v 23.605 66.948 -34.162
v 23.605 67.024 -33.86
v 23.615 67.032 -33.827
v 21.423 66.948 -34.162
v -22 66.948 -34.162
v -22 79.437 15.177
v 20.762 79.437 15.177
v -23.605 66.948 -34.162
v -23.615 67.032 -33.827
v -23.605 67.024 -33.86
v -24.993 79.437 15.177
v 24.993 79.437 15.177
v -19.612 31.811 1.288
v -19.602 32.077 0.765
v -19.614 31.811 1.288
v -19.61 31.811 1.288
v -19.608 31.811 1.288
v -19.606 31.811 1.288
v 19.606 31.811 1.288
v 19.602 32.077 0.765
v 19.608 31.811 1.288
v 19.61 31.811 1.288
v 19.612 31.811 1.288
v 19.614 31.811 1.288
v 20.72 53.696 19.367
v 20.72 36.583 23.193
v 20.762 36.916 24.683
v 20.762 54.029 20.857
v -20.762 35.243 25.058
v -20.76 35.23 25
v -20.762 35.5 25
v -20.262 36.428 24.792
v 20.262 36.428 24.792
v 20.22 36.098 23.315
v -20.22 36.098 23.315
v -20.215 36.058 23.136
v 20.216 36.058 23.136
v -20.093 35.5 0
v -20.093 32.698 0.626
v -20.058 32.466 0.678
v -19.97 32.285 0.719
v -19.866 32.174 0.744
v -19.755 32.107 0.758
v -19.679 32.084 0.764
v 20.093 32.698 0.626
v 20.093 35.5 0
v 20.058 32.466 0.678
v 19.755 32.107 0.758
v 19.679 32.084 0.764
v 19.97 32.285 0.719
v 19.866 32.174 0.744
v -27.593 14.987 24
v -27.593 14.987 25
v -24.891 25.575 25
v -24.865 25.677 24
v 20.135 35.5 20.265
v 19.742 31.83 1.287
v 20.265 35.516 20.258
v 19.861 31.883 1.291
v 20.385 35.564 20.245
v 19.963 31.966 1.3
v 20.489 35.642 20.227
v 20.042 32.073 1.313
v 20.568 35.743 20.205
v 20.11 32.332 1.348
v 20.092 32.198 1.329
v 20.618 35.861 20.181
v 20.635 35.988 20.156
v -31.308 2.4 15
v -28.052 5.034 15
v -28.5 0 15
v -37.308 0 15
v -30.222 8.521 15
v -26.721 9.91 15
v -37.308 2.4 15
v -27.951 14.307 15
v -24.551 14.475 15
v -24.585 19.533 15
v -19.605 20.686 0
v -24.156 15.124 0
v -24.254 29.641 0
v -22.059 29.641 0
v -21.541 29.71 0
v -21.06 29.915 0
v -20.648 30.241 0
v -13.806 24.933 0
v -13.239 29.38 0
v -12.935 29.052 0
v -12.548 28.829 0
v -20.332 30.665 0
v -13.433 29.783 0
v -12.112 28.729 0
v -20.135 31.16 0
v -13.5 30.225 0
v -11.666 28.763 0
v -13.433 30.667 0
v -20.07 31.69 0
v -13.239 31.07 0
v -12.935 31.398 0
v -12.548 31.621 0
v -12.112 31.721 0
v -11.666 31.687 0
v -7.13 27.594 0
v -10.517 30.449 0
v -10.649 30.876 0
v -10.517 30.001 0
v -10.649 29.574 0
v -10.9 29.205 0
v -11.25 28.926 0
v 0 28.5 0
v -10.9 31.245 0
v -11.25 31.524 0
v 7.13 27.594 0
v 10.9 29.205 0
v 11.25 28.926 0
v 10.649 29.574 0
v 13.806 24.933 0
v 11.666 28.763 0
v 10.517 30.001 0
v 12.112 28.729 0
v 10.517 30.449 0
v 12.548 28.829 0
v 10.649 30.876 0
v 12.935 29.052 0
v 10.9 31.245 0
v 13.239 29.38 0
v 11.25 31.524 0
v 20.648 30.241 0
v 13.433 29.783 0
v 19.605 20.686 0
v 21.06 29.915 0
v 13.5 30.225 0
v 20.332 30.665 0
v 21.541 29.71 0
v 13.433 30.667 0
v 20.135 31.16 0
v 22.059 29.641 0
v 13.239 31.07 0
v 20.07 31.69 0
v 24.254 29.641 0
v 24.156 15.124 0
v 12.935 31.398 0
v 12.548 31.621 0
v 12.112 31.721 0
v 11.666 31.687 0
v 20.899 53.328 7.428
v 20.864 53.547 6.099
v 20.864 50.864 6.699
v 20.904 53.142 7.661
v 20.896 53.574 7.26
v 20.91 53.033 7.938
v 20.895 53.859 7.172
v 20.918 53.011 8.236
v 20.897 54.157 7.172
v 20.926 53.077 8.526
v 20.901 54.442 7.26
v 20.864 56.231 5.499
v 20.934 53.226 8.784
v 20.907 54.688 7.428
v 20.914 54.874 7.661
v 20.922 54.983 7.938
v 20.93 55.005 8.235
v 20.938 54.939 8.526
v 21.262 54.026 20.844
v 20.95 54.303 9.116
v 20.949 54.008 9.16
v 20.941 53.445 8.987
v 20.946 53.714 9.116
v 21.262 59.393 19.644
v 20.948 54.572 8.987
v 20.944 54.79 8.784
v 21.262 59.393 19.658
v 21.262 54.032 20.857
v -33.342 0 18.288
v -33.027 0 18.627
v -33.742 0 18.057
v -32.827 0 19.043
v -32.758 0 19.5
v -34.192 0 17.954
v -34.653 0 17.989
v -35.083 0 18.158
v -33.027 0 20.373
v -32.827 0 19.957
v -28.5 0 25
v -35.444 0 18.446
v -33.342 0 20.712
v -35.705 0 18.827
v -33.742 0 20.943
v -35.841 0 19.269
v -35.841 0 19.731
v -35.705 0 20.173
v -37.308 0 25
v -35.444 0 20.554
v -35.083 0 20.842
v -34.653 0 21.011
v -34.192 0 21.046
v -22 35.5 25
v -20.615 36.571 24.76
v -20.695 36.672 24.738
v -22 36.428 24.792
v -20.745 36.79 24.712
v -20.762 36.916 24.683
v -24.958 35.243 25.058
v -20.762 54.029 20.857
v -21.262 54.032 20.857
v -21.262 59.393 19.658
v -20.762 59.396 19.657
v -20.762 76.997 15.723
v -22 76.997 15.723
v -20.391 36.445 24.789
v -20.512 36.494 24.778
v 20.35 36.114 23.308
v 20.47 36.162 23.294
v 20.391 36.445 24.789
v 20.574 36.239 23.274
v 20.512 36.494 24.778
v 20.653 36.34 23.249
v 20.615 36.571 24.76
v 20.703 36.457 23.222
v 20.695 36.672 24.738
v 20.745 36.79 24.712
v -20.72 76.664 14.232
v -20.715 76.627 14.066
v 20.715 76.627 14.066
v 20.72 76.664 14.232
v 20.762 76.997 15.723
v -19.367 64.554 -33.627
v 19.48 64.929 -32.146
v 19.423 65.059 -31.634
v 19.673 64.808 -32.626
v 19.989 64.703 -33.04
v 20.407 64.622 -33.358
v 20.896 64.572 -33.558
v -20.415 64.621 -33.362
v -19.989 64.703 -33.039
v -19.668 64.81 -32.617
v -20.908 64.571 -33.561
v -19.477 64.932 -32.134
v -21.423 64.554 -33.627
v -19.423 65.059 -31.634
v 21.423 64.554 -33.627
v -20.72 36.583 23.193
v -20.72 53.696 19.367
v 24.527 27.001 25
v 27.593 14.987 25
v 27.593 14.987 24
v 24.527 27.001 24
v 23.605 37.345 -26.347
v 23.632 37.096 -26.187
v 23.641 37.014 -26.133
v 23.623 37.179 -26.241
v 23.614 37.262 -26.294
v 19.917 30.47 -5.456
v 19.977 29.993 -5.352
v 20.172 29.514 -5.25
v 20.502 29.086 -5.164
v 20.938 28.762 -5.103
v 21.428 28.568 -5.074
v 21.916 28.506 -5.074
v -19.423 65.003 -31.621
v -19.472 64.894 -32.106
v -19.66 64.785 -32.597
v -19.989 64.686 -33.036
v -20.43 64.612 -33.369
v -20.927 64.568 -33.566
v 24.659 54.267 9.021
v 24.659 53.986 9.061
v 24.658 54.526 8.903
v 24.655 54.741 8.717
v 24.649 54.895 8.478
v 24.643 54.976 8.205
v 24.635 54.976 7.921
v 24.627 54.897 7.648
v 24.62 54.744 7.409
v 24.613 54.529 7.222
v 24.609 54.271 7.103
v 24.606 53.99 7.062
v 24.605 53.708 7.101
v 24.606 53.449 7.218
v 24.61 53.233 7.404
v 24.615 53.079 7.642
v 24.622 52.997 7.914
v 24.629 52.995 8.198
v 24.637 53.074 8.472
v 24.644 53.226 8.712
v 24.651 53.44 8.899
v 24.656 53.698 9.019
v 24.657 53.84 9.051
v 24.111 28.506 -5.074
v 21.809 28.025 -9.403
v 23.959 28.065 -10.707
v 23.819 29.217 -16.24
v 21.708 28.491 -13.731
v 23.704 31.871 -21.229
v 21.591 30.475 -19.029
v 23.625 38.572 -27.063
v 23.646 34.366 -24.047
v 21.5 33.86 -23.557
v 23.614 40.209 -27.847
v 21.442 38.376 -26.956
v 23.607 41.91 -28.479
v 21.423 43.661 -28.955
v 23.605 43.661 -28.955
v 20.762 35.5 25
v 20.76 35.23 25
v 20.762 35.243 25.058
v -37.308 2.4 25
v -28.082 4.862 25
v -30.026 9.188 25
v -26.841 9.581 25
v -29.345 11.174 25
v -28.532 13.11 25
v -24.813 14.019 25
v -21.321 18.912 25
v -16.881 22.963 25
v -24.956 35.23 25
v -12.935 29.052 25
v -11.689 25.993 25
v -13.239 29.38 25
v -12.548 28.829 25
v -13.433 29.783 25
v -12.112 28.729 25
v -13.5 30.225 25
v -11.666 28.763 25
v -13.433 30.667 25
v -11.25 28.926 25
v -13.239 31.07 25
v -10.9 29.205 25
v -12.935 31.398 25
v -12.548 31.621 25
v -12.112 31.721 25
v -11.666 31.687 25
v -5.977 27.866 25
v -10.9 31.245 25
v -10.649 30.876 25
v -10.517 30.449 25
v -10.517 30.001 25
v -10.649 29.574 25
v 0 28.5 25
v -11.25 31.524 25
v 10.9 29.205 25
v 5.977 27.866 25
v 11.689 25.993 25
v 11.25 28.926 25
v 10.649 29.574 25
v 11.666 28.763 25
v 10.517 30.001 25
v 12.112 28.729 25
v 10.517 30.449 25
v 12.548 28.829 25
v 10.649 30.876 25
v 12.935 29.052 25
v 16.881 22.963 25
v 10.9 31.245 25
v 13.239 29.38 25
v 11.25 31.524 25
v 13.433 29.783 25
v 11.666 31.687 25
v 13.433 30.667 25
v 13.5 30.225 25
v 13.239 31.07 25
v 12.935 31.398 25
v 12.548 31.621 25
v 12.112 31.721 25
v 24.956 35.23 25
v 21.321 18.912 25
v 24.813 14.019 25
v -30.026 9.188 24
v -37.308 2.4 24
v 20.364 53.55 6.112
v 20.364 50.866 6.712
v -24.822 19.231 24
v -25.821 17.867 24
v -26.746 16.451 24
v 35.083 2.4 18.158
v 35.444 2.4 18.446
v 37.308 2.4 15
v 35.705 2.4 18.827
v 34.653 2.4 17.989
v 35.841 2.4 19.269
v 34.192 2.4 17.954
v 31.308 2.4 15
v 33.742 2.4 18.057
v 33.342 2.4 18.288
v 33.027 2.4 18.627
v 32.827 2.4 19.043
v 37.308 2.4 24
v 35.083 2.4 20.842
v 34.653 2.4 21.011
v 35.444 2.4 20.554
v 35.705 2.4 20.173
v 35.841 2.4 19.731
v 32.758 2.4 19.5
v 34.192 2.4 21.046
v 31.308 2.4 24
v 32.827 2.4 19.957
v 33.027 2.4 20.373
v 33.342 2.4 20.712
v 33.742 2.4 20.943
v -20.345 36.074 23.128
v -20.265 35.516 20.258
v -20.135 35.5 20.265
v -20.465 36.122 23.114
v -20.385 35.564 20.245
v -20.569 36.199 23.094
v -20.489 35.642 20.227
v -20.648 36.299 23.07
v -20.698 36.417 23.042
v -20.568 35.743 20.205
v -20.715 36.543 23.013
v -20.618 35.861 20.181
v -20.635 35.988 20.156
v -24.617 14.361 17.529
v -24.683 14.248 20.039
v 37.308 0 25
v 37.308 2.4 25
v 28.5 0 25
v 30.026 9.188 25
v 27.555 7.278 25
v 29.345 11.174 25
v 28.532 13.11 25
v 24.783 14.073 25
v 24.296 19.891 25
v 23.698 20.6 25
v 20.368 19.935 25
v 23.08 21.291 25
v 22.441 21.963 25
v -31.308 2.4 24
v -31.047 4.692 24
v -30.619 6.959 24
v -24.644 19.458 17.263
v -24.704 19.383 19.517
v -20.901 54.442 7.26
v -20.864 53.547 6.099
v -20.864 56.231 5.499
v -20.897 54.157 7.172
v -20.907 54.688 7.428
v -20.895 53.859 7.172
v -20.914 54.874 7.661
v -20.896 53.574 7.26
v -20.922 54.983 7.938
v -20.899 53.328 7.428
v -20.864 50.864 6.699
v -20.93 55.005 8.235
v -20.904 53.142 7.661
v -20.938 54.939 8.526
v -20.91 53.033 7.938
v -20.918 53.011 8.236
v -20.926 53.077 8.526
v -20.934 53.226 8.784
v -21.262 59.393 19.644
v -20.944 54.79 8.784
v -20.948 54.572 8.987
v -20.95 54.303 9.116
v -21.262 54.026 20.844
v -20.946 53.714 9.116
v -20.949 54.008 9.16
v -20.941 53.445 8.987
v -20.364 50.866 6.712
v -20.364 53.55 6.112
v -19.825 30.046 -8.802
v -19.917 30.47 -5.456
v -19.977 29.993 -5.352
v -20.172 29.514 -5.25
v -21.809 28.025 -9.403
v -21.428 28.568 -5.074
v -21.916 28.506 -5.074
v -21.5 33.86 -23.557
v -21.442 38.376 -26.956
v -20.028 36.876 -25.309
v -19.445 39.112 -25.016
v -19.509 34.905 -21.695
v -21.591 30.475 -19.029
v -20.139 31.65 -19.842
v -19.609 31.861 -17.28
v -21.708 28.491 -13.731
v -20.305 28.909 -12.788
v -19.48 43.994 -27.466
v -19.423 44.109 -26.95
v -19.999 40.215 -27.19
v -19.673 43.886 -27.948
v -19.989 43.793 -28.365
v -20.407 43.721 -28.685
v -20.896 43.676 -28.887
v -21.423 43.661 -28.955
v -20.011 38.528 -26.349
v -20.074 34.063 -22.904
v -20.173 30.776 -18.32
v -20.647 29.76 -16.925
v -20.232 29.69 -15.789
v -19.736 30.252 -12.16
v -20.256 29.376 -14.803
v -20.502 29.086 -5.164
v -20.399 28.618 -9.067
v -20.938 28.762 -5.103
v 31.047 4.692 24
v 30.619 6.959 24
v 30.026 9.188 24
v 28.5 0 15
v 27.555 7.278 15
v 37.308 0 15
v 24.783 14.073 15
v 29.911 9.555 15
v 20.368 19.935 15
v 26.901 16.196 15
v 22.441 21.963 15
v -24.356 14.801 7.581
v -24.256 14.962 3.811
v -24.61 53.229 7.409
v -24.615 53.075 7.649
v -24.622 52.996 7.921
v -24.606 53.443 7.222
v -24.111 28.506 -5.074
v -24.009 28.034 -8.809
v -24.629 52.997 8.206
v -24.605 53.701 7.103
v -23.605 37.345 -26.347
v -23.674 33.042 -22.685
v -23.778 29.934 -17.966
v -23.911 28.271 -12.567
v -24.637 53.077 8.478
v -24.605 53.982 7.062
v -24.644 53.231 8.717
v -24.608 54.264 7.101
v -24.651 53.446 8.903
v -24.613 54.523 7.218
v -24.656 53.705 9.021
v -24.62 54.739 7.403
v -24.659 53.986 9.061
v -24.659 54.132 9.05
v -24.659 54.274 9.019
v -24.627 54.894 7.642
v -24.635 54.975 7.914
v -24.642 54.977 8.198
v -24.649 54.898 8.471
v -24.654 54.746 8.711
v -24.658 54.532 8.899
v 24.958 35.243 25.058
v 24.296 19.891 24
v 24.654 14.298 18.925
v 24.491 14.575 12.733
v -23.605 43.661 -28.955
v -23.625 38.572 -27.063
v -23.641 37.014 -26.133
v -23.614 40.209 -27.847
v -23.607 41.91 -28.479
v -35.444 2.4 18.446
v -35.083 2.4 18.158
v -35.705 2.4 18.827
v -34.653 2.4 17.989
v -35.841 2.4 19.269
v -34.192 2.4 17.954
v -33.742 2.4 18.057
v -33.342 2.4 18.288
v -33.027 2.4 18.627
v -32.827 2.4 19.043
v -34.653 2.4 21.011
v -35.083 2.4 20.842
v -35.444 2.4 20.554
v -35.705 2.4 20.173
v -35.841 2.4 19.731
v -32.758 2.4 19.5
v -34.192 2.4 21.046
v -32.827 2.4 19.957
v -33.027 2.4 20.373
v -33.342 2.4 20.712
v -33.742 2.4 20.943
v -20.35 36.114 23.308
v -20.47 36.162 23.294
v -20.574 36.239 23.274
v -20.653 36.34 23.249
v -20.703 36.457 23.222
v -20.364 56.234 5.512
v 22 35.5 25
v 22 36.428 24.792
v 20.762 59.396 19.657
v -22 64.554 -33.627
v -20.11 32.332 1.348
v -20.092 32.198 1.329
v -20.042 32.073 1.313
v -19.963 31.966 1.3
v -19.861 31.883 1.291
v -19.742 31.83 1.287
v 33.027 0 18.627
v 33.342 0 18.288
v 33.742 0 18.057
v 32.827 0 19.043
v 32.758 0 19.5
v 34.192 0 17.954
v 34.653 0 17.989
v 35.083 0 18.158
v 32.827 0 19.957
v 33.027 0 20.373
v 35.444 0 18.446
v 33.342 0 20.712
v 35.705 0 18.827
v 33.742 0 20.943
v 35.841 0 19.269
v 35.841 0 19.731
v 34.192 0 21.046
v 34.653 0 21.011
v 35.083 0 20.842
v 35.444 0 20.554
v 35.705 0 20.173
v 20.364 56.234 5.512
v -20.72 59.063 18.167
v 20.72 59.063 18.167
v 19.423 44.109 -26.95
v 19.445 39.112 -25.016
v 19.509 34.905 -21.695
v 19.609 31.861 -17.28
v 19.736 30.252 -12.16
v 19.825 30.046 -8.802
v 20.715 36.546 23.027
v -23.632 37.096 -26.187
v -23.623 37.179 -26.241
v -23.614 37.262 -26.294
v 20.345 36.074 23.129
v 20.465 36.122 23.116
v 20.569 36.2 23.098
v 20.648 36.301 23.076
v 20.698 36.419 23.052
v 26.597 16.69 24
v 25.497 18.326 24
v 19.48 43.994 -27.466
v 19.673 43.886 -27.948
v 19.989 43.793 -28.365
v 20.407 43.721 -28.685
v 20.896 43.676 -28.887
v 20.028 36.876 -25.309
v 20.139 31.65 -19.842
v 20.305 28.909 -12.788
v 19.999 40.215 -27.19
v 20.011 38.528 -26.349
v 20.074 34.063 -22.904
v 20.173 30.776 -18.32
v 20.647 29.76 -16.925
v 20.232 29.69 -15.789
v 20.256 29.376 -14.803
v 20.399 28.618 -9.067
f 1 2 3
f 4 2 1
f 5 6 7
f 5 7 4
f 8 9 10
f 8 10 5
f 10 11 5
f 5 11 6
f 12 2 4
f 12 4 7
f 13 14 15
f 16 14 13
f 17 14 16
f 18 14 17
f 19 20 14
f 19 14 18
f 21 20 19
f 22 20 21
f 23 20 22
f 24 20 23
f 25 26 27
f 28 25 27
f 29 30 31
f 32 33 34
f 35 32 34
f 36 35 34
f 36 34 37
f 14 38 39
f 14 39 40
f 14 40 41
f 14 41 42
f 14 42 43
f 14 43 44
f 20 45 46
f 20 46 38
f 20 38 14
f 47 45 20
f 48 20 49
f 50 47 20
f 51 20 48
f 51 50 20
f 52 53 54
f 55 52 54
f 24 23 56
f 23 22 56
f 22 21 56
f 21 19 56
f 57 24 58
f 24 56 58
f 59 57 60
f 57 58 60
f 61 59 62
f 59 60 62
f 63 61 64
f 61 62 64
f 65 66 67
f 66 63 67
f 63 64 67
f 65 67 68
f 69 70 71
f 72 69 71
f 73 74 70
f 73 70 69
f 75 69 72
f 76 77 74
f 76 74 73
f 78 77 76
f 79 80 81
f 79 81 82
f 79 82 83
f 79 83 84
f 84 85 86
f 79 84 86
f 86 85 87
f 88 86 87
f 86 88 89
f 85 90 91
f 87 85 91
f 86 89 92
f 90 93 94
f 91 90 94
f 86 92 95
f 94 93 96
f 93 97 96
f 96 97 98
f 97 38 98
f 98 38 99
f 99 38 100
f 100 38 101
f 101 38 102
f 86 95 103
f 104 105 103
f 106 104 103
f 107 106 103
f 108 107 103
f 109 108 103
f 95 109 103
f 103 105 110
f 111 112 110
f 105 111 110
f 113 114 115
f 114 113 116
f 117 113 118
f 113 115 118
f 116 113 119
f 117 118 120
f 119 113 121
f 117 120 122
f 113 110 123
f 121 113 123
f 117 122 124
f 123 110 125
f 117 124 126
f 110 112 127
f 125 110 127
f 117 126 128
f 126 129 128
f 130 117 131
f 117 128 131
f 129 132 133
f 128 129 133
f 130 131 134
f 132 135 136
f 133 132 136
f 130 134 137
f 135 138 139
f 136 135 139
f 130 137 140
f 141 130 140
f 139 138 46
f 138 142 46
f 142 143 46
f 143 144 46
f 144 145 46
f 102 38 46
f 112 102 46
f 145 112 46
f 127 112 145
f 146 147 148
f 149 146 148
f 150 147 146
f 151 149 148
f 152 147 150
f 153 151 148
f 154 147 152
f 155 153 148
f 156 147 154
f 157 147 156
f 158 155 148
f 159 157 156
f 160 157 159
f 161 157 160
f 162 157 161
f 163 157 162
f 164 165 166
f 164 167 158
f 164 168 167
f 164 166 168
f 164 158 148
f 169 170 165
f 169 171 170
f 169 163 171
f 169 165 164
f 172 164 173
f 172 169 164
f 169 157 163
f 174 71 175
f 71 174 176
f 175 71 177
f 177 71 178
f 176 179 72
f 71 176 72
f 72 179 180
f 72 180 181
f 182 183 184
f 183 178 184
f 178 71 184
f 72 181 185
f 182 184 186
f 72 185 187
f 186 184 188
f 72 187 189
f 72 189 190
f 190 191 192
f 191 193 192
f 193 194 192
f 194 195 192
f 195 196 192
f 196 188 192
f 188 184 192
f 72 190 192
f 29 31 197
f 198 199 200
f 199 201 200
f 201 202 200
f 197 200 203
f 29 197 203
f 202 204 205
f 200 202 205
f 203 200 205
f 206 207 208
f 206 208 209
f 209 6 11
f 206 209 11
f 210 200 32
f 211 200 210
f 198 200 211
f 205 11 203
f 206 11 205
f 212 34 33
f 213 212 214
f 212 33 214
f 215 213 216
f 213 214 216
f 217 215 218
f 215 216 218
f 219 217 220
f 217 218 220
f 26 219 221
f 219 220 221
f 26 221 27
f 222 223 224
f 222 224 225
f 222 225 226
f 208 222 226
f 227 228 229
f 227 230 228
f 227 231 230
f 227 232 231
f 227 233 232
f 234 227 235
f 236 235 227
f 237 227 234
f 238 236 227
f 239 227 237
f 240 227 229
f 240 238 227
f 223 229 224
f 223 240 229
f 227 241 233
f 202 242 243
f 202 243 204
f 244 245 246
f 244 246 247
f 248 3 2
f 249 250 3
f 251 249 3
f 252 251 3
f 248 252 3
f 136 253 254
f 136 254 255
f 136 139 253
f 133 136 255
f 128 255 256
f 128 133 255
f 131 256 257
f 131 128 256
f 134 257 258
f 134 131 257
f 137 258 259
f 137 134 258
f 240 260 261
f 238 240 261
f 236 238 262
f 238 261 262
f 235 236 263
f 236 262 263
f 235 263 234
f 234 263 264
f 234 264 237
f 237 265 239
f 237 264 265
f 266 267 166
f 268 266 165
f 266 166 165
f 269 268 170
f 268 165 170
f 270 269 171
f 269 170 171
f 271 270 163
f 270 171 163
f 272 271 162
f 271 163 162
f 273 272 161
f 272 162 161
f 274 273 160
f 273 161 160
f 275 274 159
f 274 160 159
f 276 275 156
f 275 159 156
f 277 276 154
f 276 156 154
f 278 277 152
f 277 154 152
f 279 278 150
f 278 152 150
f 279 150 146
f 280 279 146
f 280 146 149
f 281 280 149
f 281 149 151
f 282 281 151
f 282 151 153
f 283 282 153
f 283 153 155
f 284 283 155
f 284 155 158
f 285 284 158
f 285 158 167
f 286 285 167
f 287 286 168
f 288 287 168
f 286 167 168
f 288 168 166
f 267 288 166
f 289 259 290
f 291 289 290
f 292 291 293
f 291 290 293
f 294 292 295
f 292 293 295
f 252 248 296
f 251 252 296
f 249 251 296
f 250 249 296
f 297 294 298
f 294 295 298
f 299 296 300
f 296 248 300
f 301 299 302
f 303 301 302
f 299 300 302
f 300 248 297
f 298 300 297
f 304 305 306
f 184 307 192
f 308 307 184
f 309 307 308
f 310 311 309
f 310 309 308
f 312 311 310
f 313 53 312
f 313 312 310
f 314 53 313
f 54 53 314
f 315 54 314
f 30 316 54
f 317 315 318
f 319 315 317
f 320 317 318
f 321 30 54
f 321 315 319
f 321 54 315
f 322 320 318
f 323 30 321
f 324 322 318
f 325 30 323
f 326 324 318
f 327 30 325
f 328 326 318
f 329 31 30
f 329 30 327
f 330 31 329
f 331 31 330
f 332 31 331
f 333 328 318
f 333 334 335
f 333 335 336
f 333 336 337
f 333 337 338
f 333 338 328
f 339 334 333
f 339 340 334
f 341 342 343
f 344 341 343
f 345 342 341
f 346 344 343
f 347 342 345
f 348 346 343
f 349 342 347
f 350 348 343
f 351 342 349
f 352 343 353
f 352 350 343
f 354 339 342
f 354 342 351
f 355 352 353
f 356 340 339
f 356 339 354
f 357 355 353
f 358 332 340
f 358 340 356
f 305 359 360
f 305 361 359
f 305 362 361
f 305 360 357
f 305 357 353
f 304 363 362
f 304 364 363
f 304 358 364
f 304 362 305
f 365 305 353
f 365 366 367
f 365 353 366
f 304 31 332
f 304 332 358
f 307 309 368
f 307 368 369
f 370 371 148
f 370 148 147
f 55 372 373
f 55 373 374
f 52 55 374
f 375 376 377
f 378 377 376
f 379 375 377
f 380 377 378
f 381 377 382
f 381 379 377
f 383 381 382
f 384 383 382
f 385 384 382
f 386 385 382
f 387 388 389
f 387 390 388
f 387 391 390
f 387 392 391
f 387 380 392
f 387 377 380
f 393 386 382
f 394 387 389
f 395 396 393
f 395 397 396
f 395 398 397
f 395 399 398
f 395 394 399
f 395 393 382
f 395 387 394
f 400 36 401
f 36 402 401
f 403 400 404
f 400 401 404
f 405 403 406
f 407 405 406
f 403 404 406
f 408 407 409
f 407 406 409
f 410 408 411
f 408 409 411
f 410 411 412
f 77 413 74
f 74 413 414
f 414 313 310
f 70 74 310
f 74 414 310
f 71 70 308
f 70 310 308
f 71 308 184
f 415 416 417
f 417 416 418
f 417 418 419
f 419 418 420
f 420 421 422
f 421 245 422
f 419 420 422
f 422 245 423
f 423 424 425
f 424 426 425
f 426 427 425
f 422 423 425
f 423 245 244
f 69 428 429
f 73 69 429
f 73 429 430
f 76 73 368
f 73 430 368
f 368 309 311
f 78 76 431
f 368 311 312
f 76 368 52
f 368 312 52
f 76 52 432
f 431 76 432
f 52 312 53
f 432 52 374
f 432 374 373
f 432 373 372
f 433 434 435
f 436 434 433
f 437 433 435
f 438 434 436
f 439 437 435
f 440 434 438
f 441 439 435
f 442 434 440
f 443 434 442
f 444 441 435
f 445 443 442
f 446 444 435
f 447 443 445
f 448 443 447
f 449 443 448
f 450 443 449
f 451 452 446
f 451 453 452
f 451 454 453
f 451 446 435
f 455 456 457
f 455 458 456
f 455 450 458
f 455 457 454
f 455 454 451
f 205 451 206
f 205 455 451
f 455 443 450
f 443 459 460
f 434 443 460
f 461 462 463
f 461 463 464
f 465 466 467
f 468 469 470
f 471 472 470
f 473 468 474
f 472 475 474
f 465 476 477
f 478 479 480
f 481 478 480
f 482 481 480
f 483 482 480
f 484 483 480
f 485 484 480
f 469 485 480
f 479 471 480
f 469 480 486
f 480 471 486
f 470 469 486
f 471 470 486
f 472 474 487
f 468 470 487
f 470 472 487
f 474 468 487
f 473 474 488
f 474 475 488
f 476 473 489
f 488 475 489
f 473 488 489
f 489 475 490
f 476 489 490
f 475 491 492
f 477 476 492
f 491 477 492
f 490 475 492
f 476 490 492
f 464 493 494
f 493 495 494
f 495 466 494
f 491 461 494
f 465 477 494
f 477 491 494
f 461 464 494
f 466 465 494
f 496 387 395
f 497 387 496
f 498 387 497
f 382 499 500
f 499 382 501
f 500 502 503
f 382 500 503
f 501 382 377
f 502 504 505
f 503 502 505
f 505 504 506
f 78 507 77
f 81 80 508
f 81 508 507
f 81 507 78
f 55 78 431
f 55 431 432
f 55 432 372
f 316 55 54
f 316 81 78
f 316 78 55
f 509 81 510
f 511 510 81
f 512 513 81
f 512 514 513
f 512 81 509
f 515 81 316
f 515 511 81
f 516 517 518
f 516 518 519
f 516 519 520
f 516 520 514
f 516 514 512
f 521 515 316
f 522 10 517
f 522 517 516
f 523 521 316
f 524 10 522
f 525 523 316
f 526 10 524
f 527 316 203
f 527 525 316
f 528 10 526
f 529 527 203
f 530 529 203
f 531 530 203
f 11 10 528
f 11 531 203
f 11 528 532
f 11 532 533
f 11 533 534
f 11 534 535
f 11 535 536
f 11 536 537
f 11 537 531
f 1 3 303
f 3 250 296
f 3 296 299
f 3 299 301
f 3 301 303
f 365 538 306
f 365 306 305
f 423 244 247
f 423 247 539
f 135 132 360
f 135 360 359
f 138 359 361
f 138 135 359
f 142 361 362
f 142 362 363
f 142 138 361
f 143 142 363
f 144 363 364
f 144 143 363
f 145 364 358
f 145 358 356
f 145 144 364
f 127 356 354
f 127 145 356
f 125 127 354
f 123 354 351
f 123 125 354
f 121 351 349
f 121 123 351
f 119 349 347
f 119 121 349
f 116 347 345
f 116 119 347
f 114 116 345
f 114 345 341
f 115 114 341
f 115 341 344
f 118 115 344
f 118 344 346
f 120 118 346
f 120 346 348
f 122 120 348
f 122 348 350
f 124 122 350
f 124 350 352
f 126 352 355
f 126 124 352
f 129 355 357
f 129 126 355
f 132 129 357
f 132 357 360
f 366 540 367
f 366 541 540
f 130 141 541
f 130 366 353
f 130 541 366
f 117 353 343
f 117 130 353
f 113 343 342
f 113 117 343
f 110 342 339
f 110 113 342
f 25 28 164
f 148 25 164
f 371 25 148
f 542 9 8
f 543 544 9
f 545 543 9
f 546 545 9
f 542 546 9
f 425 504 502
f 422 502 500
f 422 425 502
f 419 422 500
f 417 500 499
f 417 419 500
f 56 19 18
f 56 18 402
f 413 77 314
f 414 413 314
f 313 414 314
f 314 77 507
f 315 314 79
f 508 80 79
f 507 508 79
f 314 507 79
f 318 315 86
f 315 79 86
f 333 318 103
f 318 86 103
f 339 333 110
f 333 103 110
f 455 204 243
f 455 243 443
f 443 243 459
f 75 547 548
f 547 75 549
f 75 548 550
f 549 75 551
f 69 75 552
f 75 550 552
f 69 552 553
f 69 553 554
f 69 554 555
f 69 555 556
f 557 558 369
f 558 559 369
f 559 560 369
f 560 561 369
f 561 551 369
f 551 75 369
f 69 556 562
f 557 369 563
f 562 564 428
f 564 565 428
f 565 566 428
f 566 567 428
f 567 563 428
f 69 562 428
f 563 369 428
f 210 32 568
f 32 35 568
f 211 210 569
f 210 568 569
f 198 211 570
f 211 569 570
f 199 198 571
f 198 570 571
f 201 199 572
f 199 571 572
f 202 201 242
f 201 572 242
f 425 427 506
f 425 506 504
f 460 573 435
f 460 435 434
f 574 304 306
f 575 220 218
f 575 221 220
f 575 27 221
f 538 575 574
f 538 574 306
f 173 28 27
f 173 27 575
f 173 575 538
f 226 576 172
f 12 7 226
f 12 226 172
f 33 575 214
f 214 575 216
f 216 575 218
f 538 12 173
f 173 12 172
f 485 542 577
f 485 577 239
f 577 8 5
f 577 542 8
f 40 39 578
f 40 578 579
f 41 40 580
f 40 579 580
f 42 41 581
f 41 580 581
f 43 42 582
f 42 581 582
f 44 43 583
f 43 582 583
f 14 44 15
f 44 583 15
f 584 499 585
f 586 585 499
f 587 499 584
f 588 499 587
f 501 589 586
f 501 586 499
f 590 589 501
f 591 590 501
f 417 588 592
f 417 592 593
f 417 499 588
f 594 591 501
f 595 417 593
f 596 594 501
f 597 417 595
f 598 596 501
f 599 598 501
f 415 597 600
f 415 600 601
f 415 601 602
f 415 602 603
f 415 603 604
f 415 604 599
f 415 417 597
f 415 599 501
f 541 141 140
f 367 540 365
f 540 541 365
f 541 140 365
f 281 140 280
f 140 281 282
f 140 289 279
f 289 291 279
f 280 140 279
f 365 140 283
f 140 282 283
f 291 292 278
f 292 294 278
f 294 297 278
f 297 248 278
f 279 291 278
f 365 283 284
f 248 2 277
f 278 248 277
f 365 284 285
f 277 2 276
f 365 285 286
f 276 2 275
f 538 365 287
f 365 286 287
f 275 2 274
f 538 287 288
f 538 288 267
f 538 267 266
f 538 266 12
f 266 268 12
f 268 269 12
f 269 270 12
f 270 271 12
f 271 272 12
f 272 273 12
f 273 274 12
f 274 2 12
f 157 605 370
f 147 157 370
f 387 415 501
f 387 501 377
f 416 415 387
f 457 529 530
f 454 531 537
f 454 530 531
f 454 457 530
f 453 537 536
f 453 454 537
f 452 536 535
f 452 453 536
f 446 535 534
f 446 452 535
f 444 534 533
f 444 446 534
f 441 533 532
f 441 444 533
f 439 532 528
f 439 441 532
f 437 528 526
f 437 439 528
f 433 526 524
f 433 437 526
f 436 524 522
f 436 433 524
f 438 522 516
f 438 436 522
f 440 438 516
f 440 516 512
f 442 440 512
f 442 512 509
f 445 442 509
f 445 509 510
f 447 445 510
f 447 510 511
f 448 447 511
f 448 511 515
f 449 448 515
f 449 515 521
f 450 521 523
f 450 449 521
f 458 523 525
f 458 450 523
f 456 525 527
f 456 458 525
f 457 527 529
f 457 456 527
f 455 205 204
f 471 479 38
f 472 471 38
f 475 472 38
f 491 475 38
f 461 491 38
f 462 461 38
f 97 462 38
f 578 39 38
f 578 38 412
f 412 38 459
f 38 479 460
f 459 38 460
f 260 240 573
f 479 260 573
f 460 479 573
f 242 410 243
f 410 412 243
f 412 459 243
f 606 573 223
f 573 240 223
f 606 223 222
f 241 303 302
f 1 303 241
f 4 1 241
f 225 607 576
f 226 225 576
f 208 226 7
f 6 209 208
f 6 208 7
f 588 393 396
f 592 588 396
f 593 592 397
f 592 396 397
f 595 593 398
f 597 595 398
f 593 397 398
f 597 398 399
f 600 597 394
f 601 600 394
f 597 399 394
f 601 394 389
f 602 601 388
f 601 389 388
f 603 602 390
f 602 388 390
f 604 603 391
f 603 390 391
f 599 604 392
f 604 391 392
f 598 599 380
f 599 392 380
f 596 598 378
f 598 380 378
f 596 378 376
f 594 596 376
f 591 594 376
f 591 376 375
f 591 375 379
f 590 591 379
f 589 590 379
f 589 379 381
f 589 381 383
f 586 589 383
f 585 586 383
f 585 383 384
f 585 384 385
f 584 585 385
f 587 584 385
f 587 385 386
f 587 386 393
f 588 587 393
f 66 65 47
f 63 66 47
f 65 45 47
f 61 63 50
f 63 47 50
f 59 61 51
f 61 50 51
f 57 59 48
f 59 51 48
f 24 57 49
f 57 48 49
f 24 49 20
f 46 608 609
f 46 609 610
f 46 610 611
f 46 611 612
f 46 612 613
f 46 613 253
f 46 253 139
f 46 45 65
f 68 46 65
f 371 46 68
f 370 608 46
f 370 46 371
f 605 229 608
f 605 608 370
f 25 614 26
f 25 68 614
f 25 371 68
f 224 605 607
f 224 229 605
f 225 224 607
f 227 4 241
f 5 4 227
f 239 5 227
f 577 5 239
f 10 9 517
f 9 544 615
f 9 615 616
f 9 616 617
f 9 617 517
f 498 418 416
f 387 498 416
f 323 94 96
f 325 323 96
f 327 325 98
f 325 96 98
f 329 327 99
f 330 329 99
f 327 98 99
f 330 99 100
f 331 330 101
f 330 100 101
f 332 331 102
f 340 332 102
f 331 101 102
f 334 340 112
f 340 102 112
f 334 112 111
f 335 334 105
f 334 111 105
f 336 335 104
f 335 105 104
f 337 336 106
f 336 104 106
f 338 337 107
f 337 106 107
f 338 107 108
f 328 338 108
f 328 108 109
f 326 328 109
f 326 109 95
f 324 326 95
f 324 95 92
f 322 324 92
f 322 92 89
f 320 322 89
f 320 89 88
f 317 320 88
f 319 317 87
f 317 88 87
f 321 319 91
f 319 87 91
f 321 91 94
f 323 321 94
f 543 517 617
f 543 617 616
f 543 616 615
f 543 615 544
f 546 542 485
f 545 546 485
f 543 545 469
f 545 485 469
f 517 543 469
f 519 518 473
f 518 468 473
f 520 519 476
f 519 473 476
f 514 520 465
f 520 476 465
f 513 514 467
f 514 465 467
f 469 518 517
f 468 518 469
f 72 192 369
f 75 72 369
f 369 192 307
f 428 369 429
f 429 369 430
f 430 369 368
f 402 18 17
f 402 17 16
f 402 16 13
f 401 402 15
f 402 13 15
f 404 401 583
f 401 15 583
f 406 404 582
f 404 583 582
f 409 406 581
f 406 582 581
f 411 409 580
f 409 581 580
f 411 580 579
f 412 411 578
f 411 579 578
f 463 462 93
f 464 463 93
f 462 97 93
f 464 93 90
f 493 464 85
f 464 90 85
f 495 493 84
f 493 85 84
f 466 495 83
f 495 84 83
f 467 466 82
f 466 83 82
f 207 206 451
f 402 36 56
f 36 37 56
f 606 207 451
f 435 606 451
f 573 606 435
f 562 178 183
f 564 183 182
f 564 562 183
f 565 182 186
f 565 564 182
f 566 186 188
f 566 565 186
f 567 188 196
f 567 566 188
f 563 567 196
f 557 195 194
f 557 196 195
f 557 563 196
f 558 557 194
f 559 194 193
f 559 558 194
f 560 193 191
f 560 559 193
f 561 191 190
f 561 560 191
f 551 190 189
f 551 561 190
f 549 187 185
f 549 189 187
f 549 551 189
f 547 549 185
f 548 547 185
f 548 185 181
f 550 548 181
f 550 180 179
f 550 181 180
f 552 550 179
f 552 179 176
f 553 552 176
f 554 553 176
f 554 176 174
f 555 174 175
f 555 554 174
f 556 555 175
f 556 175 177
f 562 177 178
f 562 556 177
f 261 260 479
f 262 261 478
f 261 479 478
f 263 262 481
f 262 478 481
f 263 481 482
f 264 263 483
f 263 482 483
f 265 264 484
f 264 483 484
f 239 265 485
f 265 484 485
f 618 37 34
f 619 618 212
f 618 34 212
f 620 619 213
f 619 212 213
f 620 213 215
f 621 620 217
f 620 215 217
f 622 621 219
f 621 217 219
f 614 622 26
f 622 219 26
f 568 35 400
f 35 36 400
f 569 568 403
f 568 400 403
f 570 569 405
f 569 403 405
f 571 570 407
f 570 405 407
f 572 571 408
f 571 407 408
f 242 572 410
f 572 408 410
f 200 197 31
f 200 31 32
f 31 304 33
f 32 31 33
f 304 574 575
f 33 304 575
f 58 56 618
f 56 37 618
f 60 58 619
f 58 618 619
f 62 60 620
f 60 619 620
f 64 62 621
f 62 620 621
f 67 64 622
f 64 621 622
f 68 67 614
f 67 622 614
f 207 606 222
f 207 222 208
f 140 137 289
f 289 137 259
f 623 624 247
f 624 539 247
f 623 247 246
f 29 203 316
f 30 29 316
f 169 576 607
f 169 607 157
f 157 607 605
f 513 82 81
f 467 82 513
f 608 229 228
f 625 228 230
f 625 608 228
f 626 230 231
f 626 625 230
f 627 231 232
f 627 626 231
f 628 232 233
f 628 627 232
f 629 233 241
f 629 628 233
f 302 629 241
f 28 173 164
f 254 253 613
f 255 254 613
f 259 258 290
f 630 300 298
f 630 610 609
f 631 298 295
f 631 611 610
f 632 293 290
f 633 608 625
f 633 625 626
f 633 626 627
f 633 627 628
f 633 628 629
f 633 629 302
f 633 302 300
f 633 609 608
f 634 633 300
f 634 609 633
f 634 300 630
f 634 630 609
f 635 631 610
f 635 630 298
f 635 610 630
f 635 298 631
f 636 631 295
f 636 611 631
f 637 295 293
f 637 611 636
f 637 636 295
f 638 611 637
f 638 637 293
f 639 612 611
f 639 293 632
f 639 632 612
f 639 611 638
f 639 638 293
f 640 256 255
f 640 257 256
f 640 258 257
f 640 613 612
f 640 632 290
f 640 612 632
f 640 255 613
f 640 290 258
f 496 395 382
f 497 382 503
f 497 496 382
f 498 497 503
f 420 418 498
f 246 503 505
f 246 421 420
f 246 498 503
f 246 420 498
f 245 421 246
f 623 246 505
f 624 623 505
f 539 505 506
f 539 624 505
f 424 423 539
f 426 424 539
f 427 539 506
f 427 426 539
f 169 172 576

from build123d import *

# Parameters (mm, degrees)
BASE_R                 = 1.5
BOSS_EXTRUDE1_DEPTH    = 25
BOSS_EXTRUDE2_DEPTH    = 22
CUT_EXTRUDE1_DEPTH     = 22.5
BOSS_EXTRUDE3_START    = -33
BOSS_EXTRUDE3_DEPTH    = 55
CUT_EXTRUDE11_DEPTH    = 0.5
SKETCH23_R             = 1
CUT_EXTRUDE12_DEPTH    = 99.094279887
CUT_EXTRUDE15_DEPTH    = 76.944355981
CUT_EXTRUDE16_DEPTH    = 100.349434145
BOSS_EXTRUDE5_DEPTH    = 10
BOSS_EXTRUDE6_DEPTH    = 1
SKETCH34_R             = 1.55
CUT_EXTRUDE18_DEPTH    = 93.160571402
FILLET13_R             = 20
FILLET14_R             = 2
FILLET17_R             = 0.5
MIRROR42_COPY_1_DEPTH  = 0.5
FILLET13_OF_MIRROR42_R = 20
FILLET14_OF_MIRROR42_R = 2
FILLET17_OF_MIRROR42_R = 0.5


with BuildPart() as part:
    # base → Boss-Extrude1 (new body)
    with BuildSketch(Plane.XY):
        with BuildLine():
            Line((0, 35.5), (25, 35.5))
            Line((25, 35.5), (25, 13.683932183))
            ThreePointArc((25, 13.683932183), (14.530277574, 24.517769752), (0, 28.5))
            Line((0, 28.5), (0, 35.5))
        make_face()
        with Locations((12, 30.225)):
            Circle(BASE_R, mode=Mode.SUBTRACT)
    boss_extrude1 = extrude(amount=BOSS_EXTRUDE1_DEPTH)

    # Sketch1 → Boss-Extrude2 (add)
    with BuildSketch(Plane.ZY):
        Polygon((25, 35.5), (24.792423, 36.428467271), (23.135628798, 36.058058554), (20.264666421, 35.5), align=None)
        Polygon((15.177086702, 79.436724709), (-34.161619053, 66.947807182), (-33.626522555, 64.554384088), (14.065750651, 76.626546453), (15.722544854, 76.99695517), align=None)
    boss_extrude2 = extrude(amount=-BOSS_EXTRUDE2_DEPTH)


with BuildPart() as boss_extrude2_piece_1:
    # of the separate pieces the step leaves, piece 1, a body of its own (boss_extrude2_pieces)
    add(part.part.solids().sort_by_distance((0, 28.5, 0))[0])

    # Sketch2 → Cut-Extrude1 (cut)
    with BuildSketch(Plane.ZY):
        Polygon((0, 35.5), (0.765370017, 32.0765908), (1.287696682, 31.811250756), (20.264666421, 35.5), align=None)
    cut_extrude1 = extrude(amount=-CUT_EXTRUDE1_DEPTH, mode=Mode.SUBTRACT)

    # Sketch6 → Boss-Extrude3 (add)
    with BuildSketch(Plane(origin=(0, 49.699602786, -11.111317294), x_dir=(0, 0.21818326067427152, 0.9759078157088111), z_dir=(0, -0.9759078157088111, 0.21818326067427152)).offset(BOSS_EXTRUDE3_START)):
        Polygon((-18.731700165, -19.367108639), (30.615918322, -20.72), (32.143201147, -20.761871276), (32.143201147, -25), (-18.731700165, -23.605237363), align=None)
    boss_extrude3 = extrude(amount=BOSS_EXTRUDE3_DEPTH)

    # Sketch22 → Cut-Extrude11 (cut)
    with BuildSketch(Plane(origin=(19.865716918, -0.118828987, -0.531507949), x_dir=(0.02674450738619923, -0.00015997523468622664, 0.999642288887677), z_dir=(-0.9996244059329674, 0.00597936415982469, 0.02674498583671672))):
        Polygon((20.196212319, 59.519582361), (6.045802137, 56.354793001), (6.646020809, 53.671094519), (20.79643099, 56.835883879), (20.909777655, 56.861234262), (20.315228686, 59.519582361), align=None)
    cut_extrude11 = extrude(amount=-CUT_EXTRUDE11_DEPTH, mode=Mode.SUBTRACT)

    # Mirror2: Cut-Extrude11 across plane
    add(cut_extrude11.mirror(Plane(origin=(20.864307529, 53.547252509, 6.098763011), x_dir=(0, 0.2181832606742717, 0.975907815708811), z_dir=(0, -0.9759078157088111, 0.2181832606742717))), mode=Mode.SUBTRACT)

    # Sketch23 → Cut-Extrude12 (cut, through all)
    with BuildSketch(Plane(origin=(19.865716918, -0.118828987, -0.531507949), x_dir=(0.026744507386199233, -0.00015997523468622667, 0.999642288887677), z_dir=(-0.9996244059329675, 0.005979364159824691, 0.026744985836716723))):
        with Locations(Location((8.708767837, 54.132435198, 0), (0, 0, 0.00916607))):
            Circle(SKETCH23_R)
    cut_extrude12 = extrude(amount=-CUT_EXTRUDE12_DEPTH, mode=Mode.SUBTRACT)

    # Sketch28 → Cut-Extrude15 (cut, through all)
    with BuildSketch(Plane(origin=(0, 71.043074178, -17.982861138), x_dir=(1, 0, 0), z_dir=(0, 0.9694252279734551, -0.24538689322906931))):
        Polygon((25, -34.477438769), (28.699873794, -1.570635788), (23.605237363, 16.37756889), align=None)
    cut_extrude15 = extrude(amount=-CUT_EXTRUDE15_DEPTH, mode=Mode.SUBTRACT)

    # Sketch29 → Cut-Extrude16 (cut, through all)
    with BuildSketch(Plane.ZY):
        Polygon((-34.161619053, 66.947807182), (-36.591777489, 77.817617284), (13.057436325, 88.917669139), (15.177086702, 79.436724709), align=None)
    cut_extrude16 = extrude(amount=-CUT_EXTRUDE16_DEPTH, mode=Mode.SUBTRACT)

    # Fillet13
    fillet13_edges = [boss_extrude2_piece_1.edges().sort_by_distance(p)[0] for p in [
        (21.486173001, 24.14268742, -24.591698152),
    ]]
    fillet(fillet13_edges, radius=FILLET13_R)

    # Fillet14
    fillet14_edges = [boss_extrude2_piece_1.edges().sort_by_distance(p)[0] for p in [
        (19.367108639, 55.304325458, -31.558491209),
        (19.527741539, 31.136504682, -20.151464465),
        (19.986683172, 29.073497339, -2.536770919),
    ]]
    fillet(fillet14_edges, radius=FILLET14_R)

    # Fillet17
    fillet17_edges = [boss_extrude2_piece_1.edges().sort_by_distance(p)[0] for p in [
        (20.738599662, 36.243262913, 23.964025899),
        (20.41035558, 33.934654655, 12.21166274),
        (20.099189258, 31.943920778, 1.02653335),
    ]]
    fillet(fillet17_edges, radius=FILLET17_R)


with BuildPart() as boss_extrude2_piece_2:
    # of the separate pieces the step leaves, piece 2, a body of its own (boss_extrude2_pieces)
    add(part.part.solids().sort_by_distance((0, 79.436724709, 15.177086702))[0])


with BuildPart() as body_3:
    # Sketch33 → Boss-Extrude5 (new body)
    with BuildSketch(Plane.XY.offset(25)):
        with BuildLine():
            Line((28.5, 0), (31.5, 0))
            Line((31.5, 0), (37.308145905, 0))
            Line((37.308145905, 0), (37.308145905, 2.4))
            Line((37.308145905, 2.4), (31.308145905, 2.4))
            ThreePointArc((31.308145905, 2.4), (28.599185333, 12.96327884), (22.440740932, 21.962994933))
            Line((22.440740932, 21.962994933), (20.368188425, 19.934565465))
            ThreePointArc((20.368188425, 19.934565465), (26.388855319, 10.764679045), (28.5, 0))
        make_face()
    boss_extrude5 = extrude(amount=-BOSS_EXTRUDE5_DEPTH)

    # Sketch35 → Boss-Extrude6 (add)
    with BuildSketch(Plane.XY.offset(25)):
        Polygon((37.308145905, 2.4), (30.025781314, 2.4), (30.025781314, 9.187625182), align=None)
        Polygon((27.738483134, 14.415137804), (24.527449643, 27.000912751), (24.232182196, 17.921438743), align=None)
    boss_extrude6 = extrude(amount=-BOSS_EXTRUDE6_DEPTH)

    # Sketch34 → Cut-Extrude18 (cut, through all)
    with BuildSketch(Plane(origin=(0, 2.4, 0), x_dir=(1, 0, 0), z_dir=(0, 1, 0))):
        with Locations(Location((34.308145905, -19.5, 0), (0, 0, 180))):
            Circle(SKETCH34_R)
    cut_extrude18 = extrude(amount=-CUT_EXTRUDE18_DEPTH, mode=Mode.SUBTRACT)


with BuildPart() as boss_extrude2_piece_1_1:
    add(boss_extrude2_piece_1.part)

    add(boss_extrude2_piece_2.part)  # Mirror42 merges Boss-Extrude2 piece 2
    # Mirror42: Boss-Extrude1, Boss-Extrude2, Cut-Extrude1, Boss-Extrude3, Cut-Extrude11, Cut-Extrude12, Cut-Extrude15, Cut-Extrude16, Boss-Extrude5, Boss-Extrude6, Cut-Extrude18 across plane
    add(boss_extrude1.mirror(Plane(origin=(0, 35.5, 25), x_dir=(0, 0, 1), z_dir=(1, 0, 0))))
    add(boss_extrude2.mirror(Plane(origin=(0, 35.5, 25), x_dir=(0, 0, 1), z_dir=(1, 0, 0))))
    add(cut_extrude1.mirror(Plane(origin=(0, 35.5, 25), x_dir=(0, 0, 1), z_dir=(1, 0, 0))), mode=Mode.SUBTRACT)
    add(boss_extrude3.mirror(Plane(origin=(0, 35.5, 25), x_dir=(0, 0, 1), z_dir=(1, 0, 0))))
    add(cut_extrude11.mirror(Plane(origin=(0, 35.5, 25), x_dir=(0, 0, 1), z_dir=(1, 0, 0))), mode=Mode.SUBTRACT)
    add(cut_extrude12.mirror(Plane(origin=(0, 35.5, 25), x_dir=(0, 0, 1), z_dir=(1, 0, 0))), mode=Mode.SUBTRACT)
    add(cut_extrude15.mirror(Plane(origin=(0, 35.5, 25), x_dir=(0, 0, 1), z_dir=(1, 0, 0))), mode=Mode.SUBTRACT)
    add(cut_extrude16.mirror(Plane(origin=(0, 35.5, 25), x_dir=(0, 0, 1), z_dir=(1, 0, 0))), mode=Mode.SUBTRACT)
    add(boss_extrude5.mirror(Plane(origin=(0, 35.5, 25), x_dir=(0, 0, 1), z_dir=(1, 0, 0))))
    add(boss_extrude6.mirror(Plane(origin=(0, 35.5, 25), x_dir=(0, 0, 1), z_dir=(1, 0, 0))))
    add(cut_extrude18.mirror(Plane(origin=(0, 35.5, 25), x_dir=(0, 0, 1), z_dir=(1, 0, 0))), mode=Mode.SUBTRACT)

    # Mirror42 copy 1 sketch → Mirror42 copy 1 (cut)
    with BuildSketch(Plane(origin=(-19.865716918, 99.280376584, -22.754142537), x_dir=(-0.026744507386199226, 0.4258459105022663, 0.9044003493106167), z_dir=(0.9996244059329674, 0.00597936415982469, 0.026744985836716723))):
        Polygon((20.196212319, 59.519582361), (6.045802137, 56.354793001), (6.646020809, 53.671094519), (20.79643099, 56.835883879), (20.909777655, 56.861234262), (20.315228686, 59.519582361), align=None)
    extrude(amount=-MIRROR42_COPY_1_DEPTH, mode=Mode.SUBTRACT)

    # Fillet13 of Mirror42
    fillet13_of_mirror42_edges = [boss_extrude2_piece_1_1.edges().sort_by_distance(p)[0] for p in [
        (-21.486173001, 24.14268742, -24.591698152),
    ]]
    fillet(fillet13_of_mirror42_edges, radius=FILLET13_OF_MIRROR42_R)

    # Fillet14 of Mirror42
    fillet14_of_mirror42_edges = [boss_extrude2_piece_1_1.edges().sort_by_distance(p)[0] for p in [
        (-19.367108639, 55.304325458, -31.558491209),
        (-19.527741539, 31.136504682, -20.151464465),
        (-19.986683172, 29.073497339, -2.536770919),
    ]]
    fillet(fillet14_of_mirror42_edges, radius=FILLET14_OF_MIRROR42_R)

    # Fillet17 of Mirror42
    fillet17_of_mirror42_edges = [boss_extrude2_piece_1_1.edges().sort_by_distance(p)[0] for p in [
        (-20.738599662, 36.243262913, 23.964025899),
        (-20.41035558, 33.934654655, 12.21166274),
        (-20.099189258, 31.943920778, 1.02653335),
    ]]
    fillet(fillet17_of_mirror42_edges, radius=FILLET17_OF_MIRROR42_R)


solid = Compound([body_3.part, boss_extrude2_piece_1_1.part])
